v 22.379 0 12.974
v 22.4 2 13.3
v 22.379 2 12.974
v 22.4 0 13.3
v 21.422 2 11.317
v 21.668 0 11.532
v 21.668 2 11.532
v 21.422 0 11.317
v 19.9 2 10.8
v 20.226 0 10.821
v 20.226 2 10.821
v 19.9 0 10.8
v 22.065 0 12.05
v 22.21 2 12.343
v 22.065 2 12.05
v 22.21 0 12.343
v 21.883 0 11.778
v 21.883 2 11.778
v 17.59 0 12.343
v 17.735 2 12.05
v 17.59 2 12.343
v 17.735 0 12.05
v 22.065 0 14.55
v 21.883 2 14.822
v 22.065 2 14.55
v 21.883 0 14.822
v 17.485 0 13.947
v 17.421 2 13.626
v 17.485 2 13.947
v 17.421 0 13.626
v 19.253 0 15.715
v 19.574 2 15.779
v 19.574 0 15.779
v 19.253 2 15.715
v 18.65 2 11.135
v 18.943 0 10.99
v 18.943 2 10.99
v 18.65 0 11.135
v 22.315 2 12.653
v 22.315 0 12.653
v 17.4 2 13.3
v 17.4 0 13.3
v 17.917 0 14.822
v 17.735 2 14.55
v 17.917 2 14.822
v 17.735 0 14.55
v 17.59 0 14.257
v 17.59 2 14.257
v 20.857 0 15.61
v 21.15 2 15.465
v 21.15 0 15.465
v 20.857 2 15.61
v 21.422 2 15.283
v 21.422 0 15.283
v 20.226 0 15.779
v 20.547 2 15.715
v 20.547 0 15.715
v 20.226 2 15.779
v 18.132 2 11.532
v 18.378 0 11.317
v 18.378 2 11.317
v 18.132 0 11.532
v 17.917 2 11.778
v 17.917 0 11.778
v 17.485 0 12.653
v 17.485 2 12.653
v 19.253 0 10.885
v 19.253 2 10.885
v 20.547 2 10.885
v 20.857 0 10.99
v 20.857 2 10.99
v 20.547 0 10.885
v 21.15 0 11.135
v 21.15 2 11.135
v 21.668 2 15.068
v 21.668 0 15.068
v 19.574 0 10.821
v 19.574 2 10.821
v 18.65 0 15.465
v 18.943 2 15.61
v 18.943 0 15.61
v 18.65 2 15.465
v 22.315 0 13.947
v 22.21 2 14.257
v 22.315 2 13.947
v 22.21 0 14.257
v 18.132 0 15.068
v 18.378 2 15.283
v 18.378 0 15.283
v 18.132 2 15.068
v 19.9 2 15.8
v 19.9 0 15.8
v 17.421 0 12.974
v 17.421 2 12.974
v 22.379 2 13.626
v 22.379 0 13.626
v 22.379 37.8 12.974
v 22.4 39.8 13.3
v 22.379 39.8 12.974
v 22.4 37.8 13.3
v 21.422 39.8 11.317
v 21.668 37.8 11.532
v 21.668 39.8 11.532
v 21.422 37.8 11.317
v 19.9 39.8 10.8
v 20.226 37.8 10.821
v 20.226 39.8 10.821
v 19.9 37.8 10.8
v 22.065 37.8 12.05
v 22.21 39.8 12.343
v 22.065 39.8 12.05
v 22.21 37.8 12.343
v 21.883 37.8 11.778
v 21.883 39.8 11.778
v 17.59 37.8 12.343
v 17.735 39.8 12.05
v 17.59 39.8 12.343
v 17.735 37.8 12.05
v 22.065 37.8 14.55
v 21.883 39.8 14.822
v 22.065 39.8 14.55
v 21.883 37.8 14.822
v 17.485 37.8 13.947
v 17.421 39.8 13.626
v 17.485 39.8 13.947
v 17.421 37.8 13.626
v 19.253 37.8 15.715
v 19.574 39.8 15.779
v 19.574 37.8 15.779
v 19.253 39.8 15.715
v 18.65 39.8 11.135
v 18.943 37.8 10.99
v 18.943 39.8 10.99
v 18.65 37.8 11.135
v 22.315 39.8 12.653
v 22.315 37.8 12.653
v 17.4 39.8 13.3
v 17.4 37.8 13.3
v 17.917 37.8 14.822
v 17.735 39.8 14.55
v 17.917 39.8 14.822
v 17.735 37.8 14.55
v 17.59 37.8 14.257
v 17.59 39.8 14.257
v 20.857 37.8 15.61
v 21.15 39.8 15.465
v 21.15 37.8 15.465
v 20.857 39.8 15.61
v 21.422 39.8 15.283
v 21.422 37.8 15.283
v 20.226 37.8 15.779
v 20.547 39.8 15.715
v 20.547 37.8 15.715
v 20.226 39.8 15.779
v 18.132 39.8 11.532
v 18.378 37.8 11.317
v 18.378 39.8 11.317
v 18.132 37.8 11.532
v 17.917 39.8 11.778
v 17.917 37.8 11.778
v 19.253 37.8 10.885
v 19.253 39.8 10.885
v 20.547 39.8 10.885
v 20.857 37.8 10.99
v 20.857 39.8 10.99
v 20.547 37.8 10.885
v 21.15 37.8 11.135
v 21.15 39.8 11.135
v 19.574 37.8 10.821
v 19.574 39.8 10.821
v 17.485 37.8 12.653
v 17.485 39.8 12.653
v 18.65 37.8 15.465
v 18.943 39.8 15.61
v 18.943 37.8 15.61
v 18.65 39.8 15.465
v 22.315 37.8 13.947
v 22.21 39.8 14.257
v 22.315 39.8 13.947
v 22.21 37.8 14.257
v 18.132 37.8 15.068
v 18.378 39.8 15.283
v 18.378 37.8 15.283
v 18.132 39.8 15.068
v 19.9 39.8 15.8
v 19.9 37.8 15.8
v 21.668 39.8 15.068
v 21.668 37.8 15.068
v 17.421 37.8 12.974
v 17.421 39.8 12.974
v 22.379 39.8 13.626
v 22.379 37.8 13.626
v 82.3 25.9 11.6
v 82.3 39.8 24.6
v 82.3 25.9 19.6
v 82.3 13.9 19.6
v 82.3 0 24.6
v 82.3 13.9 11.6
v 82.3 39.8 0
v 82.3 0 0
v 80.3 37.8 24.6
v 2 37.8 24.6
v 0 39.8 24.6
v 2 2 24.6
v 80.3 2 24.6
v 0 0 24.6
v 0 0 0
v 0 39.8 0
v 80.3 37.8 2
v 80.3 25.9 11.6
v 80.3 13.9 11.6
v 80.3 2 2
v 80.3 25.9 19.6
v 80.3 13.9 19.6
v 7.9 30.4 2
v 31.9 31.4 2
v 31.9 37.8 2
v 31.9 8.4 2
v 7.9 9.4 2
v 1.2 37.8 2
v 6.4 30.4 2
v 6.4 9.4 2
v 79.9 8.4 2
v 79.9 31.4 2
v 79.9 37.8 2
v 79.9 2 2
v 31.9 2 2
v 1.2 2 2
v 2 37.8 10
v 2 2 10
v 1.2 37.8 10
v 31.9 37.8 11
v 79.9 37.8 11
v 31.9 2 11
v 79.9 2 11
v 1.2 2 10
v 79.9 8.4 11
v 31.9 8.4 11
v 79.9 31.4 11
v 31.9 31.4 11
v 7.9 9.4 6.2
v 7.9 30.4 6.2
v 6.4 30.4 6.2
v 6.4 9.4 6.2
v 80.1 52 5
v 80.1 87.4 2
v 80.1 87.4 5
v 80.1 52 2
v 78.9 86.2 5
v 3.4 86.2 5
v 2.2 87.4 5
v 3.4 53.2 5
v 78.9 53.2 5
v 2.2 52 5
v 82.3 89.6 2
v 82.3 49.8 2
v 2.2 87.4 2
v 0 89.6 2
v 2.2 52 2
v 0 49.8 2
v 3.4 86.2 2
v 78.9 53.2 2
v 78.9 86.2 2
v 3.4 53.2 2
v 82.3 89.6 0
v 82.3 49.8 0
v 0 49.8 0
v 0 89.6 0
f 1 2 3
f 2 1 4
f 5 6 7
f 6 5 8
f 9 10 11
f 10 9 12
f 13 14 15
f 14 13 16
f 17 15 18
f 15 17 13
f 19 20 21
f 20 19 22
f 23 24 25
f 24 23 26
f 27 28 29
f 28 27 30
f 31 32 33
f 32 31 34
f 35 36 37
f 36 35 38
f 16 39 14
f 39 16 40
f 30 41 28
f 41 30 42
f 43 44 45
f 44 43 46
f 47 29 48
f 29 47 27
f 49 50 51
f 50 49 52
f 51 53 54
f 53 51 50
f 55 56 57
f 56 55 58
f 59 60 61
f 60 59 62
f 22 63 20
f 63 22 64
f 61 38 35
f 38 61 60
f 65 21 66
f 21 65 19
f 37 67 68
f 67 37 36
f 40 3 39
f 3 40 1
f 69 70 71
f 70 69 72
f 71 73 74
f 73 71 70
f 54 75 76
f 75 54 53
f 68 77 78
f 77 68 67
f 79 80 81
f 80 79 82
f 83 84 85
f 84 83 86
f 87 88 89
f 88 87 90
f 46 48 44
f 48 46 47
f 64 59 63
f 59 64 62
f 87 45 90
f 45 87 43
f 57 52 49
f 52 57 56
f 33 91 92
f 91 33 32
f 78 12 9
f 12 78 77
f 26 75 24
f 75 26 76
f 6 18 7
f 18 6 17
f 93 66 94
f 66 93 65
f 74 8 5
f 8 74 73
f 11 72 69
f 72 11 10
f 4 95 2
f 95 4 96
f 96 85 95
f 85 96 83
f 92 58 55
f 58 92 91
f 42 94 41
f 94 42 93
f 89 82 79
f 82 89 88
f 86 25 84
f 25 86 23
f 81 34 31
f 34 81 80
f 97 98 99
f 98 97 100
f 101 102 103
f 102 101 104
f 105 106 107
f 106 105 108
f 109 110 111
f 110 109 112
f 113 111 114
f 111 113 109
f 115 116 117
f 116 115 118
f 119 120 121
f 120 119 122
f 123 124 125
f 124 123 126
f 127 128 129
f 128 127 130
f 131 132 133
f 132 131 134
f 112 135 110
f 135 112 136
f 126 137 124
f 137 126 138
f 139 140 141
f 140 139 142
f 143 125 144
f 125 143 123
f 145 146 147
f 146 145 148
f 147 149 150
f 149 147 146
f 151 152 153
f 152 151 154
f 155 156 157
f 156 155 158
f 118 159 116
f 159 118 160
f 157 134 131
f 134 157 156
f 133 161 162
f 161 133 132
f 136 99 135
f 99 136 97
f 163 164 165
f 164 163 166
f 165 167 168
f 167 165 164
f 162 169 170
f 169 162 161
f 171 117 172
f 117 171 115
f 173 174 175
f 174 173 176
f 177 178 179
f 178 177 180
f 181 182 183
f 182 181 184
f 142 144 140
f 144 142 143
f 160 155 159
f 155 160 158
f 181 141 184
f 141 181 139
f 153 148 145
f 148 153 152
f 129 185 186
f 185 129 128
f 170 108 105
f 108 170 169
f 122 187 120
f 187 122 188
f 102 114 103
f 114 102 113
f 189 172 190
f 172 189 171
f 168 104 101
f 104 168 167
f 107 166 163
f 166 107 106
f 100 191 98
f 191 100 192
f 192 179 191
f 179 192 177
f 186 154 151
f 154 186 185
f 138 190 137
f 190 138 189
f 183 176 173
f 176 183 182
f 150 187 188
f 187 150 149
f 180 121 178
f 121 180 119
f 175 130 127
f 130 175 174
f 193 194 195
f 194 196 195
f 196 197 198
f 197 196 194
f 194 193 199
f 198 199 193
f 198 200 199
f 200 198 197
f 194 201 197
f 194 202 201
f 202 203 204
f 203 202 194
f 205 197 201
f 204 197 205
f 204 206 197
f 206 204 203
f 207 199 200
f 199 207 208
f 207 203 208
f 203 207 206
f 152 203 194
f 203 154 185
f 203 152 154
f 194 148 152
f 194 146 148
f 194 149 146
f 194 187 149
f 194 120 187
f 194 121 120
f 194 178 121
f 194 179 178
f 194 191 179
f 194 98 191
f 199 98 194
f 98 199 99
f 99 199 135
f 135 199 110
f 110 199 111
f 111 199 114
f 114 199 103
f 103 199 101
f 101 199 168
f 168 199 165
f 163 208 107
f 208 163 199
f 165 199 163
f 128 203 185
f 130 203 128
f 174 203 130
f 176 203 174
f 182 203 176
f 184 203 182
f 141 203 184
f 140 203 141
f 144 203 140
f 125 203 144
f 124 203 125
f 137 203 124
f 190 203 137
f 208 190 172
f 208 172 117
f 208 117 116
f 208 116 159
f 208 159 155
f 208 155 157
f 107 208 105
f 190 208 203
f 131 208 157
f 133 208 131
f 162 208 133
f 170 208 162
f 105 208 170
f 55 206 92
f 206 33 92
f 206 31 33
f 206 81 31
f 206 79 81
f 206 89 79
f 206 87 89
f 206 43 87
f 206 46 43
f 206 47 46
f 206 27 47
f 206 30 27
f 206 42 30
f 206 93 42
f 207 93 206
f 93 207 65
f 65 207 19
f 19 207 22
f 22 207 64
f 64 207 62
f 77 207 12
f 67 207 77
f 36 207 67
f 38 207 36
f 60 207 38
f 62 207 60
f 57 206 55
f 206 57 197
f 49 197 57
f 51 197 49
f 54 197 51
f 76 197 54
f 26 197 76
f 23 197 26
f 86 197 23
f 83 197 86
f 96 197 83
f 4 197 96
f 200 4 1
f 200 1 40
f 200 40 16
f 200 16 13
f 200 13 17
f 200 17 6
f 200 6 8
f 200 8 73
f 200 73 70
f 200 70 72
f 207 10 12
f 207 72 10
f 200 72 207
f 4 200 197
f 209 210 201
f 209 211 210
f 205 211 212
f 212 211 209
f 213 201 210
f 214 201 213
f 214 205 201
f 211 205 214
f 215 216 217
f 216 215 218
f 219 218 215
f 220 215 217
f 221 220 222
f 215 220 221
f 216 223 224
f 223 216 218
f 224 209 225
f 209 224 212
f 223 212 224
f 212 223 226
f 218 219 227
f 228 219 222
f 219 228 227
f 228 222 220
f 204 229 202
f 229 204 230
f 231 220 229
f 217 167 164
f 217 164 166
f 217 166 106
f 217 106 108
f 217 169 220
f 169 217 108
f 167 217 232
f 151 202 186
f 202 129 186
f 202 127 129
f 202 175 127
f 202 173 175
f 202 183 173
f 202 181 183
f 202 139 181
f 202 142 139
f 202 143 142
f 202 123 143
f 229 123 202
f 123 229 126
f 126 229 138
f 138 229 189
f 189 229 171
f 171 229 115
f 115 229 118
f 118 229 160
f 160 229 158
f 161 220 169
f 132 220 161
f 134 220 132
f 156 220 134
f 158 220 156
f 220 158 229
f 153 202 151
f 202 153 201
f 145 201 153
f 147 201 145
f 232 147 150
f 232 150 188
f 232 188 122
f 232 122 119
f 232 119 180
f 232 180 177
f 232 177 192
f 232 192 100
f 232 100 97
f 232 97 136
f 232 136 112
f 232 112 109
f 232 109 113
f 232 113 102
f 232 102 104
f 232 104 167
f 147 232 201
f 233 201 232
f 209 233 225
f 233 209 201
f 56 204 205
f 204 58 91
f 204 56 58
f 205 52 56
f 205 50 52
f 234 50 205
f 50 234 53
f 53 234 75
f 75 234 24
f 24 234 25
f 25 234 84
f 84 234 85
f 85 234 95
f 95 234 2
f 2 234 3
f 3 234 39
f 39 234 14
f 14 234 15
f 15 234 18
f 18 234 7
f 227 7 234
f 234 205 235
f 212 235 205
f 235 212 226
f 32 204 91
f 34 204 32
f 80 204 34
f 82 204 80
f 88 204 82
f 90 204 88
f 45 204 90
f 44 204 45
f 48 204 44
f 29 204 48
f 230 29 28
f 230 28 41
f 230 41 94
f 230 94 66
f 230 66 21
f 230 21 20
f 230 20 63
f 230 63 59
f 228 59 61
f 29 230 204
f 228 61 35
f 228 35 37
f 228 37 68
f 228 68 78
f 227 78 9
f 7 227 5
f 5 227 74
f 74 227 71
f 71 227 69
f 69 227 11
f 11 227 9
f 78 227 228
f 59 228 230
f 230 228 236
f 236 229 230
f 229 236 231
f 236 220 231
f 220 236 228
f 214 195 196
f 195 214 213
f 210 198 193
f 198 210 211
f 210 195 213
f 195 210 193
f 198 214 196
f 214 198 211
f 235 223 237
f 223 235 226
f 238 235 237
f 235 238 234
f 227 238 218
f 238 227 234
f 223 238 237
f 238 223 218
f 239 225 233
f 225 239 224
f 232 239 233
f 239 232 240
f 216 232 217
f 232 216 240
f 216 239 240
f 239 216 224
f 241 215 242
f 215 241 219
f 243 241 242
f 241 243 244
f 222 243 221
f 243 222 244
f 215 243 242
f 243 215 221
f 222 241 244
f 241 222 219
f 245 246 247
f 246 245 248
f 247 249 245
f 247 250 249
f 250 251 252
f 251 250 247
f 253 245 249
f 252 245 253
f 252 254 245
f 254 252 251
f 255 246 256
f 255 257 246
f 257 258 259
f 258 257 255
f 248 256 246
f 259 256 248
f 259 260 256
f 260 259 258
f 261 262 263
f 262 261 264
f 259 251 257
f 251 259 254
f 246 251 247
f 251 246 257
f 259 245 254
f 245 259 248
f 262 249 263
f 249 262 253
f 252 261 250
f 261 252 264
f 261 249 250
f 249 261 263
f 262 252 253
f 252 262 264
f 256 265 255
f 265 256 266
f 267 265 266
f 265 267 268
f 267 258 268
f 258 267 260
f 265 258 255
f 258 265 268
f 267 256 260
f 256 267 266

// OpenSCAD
// Desk lamp controller case: NodeMCU v2 + HLK-LD2410 + 5V power split.
// Measure your parts and adjust the values below before printing.
// part = "box" | "lid" | "both"

part = "both";

wall = 2;
floor_t = 2;
radar_wall = 1.2;   // thin, plastic only in front of the radar antenna
clear = 0.4;

mcu_l = 48;         // NodeMCU v2 board length (some are 58)
mcu_w = 26;         // NodeMCU v2 board width (some are 31)
pcb_t = 1.6;
mcu_under = 9;      // header pins below the board
mcu_over = 12;      // ESP shield + dupont connectors above the board

radar_l = 35;
radar_h = 7;
radar_t = 4;        // PCB plus components on the back

splice_l = 24;      // bay for the 5V split and a 10x16mm capacitor lying flat
cable_d = 5;        // USB-in cable and lamp cable
usb_w = 12;
usb_h = 8;

rail_w = 1.5;
rib_t = 1.5;
lip_h = 3;
lip_t = 1.2;
lid_t = 2;

in_w = max(mcu_w, radar_l) + 2 * clear;
in_l = radar_t + clear + rib_t + splice_l + mcu_l + clear;
in_h = mcu_under + pcb_t + mcu_over;

out_l = in_l + 2 * wall;
out_w = in_w + 2 * wall;
out_h = in_h + floor_t;

radar_x = wall;
splice_x = radar_x + radar_t + clear + rib_t;
mcu_x = splice_x + splice_l;
board_z = floor_t + mcu_under;

$fn = 48;

module box() {
    difference() {
        cube([out_l, out_w, out_h]);
        translate([wall, wall, floor_t]) cube([in_l, in_w, in_h + 1]);

        // thin window in front of the radar
        translate([radar_wall, wall, floor_t])
            cube([wall - radar_wall + 0.01, in_w, radar_h + 1]);

        // micro-USB access on the back wall, for recovery flashing only
        translate([out_l - wall - 1, (out_w - usb_w) / 2, board_z + pcb_t - 1])
            cube([wall + 2, usb_w, usb_h]);

        // USB-in on one side, lamp cable on the other, both at the splice bay
        for (y = [-1, out_w - wall - 1])
            translate([splice_x + splice_l / 2, y, floor_t + in_h / 2])
                rotate([-90, 0, 0]) cylinder(d = cable_d, h = wall + 2);
    }

    // rib holding the radar against the front window
    rib_len = radar_l * 0.6;
    translate([radar_x + radar_t + clear, wall + (in_w - rib_len) / 2, floor_t])
        cube([rib_t, rib_len, radar_h * 0.6]);

    // side rails the NodeMCU rests on, header pins hang between them
    rail_reach = (in_w - mcu_w) / 2 + rail_w;
    for (y = [wall, out_w - wall - rail_reach])
        translate([mcu_x, y, floor_t]) cube([mcu_l, rail_reach, mcu_under]);
}

module lid() {
    cube([out_l, out_w, lid_t]);
    translate([wall + clear / 2, wall + clear / 2, lid_t])
        difference() {
            cube([in_l - clear, in_w - clear, lip_h]);
            translate([lip_t, lip_t, -1])
                cube([in_l - clear - 2 * lip_t, in_w - clear - 2 * lip_t, lip_h + 2]);
        }
}

if (part == "box" || part == "both") box();
if (part == "lid" || part == "both") translate([0, out_w + 10, 0]) lid();

echo(str("outer size: ", out_l, " x ", out_w, " x ", out_h + lid_t, " mm"));
